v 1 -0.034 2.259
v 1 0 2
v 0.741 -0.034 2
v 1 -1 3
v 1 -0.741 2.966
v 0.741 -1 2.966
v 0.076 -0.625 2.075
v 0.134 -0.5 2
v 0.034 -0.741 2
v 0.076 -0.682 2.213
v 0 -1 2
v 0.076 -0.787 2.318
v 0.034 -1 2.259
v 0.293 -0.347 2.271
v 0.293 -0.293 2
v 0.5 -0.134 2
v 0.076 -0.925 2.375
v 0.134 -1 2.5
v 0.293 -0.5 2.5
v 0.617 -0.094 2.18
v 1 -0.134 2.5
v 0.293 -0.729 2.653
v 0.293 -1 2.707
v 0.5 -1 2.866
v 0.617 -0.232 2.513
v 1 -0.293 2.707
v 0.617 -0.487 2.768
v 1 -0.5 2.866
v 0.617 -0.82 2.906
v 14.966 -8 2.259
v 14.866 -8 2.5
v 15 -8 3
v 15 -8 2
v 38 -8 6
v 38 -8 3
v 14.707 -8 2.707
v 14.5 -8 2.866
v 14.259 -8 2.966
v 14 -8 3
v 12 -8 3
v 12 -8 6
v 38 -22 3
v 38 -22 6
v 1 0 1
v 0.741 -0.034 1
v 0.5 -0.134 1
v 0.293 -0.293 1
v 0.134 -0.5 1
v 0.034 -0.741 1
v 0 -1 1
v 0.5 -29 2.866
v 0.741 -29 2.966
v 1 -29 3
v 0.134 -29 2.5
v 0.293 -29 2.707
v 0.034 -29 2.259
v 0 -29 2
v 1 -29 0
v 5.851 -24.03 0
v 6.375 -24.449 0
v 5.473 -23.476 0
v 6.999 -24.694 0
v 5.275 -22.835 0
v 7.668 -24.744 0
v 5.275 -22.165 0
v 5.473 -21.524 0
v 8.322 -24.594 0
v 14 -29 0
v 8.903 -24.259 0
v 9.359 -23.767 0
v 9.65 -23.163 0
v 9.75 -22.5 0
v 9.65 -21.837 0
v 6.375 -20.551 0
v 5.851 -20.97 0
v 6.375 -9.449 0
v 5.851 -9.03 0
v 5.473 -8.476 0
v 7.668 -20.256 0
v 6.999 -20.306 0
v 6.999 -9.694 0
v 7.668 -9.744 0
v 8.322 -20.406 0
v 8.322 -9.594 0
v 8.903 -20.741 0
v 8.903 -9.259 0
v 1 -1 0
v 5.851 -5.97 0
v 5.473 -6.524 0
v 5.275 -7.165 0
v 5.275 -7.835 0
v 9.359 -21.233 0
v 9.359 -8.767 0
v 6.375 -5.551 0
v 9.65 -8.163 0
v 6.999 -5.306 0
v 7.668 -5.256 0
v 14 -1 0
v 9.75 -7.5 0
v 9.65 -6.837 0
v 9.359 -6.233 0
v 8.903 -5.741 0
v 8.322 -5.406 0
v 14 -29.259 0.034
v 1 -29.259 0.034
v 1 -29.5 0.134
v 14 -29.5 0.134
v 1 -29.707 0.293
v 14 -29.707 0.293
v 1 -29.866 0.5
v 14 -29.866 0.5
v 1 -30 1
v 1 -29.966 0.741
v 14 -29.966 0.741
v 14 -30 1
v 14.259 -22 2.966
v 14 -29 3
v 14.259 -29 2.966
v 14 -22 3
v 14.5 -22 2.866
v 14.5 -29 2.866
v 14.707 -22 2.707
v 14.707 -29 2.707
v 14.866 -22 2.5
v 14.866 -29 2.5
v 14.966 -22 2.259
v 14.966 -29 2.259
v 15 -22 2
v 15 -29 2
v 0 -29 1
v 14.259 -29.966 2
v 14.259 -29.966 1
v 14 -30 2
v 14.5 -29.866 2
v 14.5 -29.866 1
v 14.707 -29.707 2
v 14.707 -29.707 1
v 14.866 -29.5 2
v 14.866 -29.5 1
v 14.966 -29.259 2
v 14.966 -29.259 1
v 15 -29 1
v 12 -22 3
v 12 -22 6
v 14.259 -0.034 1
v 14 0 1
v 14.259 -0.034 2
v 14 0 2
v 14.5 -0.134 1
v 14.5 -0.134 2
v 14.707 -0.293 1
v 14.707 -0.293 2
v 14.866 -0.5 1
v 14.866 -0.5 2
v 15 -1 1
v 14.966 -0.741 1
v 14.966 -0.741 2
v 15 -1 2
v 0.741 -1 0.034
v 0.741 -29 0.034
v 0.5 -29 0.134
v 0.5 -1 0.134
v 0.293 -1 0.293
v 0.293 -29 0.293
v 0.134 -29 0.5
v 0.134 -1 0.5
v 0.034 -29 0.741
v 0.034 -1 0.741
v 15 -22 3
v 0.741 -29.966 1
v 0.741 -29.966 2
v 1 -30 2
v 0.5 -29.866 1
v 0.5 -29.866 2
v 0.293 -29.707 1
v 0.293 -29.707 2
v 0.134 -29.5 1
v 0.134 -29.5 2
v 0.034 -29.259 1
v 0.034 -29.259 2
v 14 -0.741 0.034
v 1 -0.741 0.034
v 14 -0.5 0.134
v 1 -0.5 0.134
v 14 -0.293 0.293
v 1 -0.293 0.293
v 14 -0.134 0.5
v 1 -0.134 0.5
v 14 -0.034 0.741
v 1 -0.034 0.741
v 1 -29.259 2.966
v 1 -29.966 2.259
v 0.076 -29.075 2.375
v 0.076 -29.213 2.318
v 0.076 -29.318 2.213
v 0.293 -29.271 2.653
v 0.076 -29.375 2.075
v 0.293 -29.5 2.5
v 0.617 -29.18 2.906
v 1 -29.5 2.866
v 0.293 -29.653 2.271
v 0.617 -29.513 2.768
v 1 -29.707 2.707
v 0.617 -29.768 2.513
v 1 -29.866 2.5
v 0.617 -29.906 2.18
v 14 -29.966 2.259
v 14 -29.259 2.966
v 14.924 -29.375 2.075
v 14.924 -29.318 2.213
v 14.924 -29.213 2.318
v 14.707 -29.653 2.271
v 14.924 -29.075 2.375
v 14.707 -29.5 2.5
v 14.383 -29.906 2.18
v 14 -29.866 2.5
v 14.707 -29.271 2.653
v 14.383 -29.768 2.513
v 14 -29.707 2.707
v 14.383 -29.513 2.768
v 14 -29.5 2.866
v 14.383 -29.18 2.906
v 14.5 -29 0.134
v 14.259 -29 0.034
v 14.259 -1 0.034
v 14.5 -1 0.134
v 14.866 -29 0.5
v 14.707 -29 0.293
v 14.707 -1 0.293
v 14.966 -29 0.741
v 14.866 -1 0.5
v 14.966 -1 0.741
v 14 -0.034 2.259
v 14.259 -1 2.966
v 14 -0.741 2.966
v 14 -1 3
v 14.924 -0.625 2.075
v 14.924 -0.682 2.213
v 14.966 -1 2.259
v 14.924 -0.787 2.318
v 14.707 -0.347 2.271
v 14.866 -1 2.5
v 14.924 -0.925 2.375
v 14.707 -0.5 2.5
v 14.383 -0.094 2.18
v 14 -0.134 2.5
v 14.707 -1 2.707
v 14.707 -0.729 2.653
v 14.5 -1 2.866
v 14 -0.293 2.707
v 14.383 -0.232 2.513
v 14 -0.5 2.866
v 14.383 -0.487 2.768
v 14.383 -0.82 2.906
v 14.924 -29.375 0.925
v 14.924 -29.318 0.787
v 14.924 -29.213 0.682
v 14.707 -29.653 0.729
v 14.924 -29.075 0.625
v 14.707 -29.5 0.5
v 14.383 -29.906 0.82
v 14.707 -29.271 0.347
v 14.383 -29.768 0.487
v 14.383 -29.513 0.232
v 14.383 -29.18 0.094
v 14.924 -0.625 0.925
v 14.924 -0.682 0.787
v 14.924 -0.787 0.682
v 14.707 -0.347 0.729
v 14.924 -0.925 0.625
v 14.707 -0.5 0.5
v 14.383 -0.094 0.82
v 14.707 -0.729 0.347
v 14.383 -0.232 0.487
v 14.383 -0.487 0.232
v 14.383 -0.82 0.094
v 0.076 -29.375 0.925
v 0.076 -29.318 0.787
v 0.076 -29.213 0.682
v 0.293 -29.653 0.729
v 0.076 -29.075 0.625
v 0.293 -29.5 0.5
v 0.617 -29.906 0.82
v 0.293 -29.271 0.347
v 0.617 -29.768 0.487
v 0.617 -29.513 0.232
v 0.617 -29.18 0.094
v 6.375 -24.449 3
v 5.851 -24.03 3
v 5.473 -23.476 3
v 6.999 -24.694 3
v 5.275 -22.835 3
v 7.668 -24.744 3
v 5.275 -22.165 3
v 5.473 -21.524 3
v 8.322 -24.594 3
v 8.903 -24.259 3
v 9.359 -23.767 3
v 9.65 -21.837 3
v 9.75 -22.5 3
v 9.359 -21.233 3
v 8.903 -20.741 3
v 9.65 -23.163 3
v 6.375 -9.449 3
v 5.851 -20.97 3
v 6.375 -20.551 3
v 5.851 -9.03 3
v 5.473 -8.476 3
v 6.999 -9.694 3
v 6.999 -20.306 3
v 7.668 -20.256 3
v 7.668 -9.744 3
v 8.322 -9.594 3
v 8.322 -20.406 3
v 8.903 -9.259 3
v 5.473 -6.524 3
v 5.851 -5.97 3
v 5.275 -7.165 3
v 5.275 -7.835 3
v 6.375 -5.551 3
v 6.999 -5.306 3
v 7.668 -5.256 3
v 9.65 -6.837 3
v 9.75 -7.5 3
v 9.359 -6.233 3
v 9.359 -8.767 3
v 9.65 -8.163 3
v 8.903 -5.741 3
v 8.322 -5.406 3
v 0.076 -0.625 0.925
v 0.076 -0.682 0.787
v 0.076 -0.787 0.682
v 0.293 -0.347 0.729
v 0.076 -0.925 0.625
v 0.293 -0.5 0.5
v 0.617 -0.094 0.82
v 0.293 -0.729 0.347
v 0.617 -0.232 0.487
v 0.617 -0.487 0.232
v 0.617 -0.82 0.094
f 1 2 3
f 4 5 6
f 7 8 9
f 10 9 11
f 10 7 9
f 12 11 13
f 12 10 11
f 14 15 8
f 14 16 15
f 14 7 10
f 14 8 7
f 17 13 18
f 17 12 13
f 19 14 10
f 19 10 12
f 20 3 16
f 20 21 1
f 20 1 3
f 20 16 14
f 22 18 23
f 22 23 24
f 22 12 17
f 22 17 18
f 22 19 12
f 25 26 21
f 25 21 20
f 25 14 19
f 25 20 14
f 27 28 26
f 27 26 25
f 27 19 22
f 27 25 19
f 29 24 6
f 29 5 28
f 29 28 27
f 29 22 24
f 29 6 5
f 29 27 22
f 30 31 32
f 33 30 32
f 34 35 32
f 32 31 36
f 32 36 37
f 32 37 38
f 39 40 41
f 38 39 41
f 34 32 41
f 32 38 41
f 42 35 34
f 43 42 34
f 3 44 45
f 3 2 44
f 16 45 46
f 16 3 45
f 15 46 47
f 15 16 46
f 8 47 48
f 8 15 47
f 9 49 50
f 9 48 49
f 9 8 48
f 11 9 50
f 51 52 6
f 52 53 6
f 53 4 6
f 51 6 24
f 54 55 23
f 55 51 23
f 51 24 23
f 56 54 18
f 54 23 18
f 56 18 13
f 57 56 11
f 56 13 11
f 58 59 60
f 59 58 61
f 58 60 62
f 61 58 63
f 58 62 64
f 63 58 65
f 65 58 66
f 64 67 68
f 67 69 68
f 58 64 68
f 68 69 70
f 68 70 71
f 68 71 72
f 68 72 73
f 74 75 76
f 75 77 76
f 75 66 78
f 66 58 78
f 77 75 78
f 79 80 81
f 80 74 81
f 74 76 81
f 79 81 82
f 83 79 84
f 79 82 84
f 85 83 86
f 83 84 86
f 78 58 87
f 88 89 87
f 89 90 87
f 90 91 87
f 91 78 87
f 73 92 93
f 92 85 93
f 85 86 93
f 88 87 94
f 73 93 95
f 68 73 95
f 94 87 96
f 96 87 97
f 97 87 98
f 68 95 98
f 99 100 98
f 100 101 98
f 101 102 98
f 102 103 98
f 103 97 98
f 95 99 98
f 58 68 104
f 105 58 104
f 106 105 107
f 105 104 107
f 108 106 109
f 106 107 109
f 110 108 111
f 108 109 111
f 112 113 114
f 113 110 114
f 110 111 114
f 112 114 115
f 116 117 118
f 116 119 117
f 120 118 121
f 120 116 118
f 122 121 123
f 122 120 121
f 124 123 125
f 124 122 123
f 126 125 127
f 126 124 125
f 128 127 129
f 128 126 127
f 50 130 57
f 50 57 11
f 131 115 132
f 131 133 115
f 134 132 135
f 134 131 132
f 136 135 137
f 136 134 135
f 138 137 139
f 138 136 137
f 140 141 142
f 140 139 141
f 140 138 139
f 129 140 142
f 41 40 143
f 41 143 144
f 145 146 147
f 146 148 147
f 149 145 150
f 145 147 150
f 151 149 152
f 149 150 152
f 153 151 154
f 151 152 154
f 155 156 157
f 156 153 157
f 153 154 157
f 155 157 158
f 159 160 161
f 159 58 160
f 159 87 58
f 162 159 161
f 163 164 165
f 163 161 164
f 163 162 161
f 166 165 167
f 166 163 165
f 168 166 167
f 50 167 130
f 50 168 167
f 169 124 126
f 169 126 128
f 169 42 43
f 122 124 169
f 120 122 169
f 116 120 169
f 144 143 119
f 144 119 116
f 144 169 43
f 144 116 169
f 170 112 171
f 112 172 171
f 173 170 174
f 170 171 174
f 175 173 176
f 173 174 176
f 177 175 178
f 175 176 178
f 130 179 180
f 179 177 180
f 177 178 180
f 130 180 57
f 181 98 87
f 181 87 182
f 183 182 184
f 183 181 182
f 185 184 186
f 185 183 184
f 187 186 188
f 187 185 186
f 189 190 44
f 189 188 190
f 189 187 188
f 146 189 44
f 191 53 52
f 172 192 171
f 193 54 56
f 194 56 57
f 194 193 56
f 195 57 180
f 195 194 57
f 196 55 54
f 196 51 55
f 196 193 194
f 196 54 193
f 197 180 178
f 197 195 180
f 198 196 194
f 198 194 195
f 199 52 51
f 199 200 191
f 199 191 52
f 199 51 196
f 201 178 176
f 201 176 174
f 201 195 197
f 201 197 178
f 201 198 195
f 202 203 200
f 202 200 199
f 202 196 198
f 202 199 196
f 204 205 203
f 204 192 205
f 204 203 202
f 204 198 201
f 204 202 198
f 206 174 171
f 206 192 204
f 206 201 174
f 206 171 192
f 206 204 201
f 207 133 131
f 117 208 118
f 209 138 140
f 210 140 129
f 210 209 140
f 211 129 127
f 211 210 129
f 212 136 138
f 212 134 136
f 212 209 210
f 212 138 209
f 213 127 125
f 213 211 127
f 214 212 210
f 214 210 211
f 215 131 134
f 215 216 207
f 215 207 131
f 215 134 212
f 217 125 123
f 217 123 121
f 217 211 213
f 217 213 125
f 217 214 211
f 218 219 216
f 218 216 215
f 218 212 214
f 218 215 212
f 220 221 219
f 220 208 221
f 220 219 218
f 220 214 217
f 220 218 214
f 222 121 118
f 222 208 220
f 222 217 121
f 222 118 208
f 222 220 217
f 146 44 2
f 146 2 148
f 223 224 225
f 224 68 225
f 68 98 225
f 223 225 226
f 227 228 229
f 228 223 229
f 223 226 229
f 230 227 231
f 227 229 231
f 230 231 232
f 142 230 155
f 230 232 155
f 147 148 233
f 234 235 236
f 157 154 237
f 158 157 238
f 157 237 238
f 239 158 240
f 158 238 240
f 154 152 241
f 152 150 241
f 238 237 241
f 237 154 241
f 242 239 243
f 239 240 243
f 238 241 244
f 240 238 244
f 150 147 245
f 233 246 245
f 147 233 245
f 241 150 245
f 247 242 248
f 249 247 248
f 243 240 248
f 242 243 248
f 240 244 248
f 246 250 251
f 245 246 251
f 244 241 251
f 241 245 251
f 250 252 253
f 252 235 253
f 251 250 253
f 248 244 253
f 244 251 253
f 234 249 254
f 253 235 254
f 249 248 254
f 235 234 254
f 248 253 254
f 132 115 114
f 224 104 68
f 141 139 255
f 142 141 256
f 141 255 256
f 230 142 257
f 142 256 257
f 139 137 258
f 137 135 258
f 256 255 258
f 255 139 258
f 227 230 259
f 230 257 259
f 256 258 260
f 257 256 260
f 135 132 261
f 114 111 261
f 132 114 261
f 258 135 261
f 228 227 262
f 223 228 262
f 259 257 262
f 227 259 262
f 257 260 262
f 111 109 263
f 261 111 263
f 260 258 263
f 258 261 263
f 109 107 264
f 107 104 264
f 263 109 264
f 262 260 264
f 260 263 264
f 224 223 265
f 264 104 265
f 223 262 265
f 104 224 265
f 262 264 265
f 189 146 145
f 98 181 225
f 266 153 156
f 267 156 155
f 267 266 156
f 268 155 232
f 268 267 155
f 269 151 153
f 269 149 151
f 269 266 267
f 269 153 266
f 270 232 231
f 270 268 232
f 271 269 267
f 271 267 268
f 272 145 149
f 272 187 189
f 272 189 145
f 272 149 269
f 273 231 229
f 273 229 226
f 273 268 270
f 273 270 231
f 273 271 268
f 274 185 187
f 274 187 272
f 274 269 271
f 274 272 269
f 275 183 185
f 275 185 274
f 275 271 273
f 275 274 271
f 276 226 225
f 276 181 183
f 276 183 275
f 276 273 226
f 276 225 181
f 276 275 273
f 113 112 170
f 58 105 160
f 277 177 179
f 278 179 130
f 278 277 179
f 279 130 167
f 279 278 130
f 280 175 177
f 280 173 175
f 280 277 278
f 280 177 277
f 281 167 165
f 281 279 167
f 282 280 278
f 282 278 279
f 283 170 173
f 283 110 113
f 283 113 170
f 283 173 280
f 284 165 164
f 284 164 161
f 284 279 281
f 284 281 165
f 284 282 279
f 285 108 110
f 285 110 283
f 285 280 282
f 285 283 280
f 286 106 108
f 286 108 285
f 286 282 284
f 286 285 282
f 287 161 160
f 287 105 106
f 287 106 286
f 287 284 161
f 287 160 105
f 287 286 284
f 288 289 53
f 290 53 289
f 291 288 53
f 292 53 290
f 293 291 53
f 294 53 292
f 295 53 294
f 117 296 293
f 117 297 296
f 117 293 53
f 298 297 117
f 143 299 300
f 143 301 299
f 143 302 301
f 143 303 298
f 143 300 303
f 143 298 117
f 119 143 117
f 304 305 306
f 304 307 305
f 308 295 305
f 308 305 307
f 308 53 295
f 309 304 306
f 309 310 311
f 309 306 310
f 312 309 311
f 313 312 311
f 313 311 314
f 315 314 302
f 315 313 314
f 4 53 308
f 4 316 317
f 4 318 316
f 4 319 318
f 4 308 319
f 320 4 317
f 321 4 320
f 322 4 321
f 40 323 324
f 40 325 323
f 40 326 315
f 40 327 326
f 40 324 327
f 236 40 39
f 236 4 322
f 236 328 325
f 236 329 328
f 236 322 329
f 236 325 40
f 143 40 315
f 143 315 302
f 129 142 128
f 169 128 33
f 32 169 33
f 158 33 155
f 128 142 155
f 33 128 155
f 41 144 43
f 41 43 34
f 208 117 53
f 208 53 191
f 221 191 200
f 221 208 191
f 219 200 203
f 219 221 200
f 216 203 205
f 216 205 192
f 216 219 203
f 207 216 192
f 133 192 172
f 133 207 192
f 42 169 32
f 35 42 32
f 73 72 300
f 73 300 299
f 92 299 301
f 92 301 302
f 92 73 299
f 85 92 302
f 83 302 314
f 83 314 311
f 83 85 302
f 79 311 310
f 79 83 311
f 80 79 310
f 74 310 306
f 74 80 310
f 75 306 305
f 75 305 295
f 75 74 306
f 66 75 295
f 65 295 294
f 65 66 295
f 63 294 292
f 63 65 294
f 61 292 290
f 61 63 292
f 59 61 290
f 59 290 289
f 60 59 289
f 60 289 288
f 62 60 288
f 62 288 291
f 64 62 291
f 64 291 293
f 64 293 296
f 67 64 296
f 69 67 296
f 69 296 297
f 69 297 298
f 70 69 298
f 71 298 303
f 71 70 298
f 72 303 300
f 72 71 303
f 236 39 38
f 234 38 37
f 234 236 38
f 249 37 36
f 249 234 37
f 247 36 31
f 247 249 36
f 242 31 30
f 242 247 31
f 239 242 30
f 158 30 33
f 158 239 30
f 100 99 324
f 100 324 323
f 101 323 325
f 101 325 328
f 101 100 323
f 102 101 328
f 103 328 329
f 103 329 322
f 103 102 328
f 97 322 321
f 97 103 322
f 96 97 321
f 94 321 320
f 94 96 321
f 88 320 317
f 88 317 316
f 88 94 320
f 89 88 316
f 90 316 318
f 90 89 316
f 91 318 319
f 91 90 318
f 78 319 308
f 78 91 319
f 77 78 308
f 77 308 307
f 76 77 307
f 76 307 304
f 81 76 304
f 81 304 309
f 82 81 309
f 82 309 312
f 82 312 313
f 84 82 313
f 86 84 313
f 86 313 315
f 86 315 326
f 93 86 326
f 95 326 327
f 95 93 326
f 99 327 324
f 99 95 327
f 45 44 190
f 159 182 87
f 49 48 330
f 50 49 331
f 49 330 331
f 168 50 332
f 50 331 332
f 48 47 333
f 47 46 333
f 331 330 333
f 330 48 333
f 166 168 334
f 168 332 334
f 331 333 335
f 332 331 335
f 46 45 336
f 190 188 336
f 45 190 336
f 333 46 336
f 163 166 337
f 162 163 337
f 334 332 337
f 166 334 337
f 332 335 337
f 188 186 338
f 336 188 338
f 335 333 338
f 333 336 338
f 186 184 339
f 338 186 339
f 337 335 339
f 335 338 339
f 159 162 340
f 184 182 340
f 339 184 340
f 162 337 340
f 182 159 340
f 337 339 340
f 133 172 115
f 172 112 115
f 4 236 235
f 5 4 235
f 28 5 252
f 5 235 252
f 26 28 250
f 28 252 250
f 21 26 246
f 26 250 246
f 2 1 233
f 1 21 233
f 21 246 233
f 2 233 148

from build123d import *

# Parameters (mm, degrees)
SKETCH1_W           = 15
SKETCH1_H           = 30
SKETCH1_R           = 2.25
BOSS_EXTRUDE1_DEPTH = 3
SKETCH3_W           = 3
SKETCH3_H           = 14
BOSS_EXTRUDE2_DEPTH = 3
SKETCH4_W           = 3
SKETCH4_H           = 14
BOSS_EXTRUDE3_DEPTH = 26
FILLET2_R           = 1


with BuildPart() as part:
    # Sketch1 → Boss-Extrude1 (new body)
    with BuildSketch(Plane.XY):
        with Locations((7.5, -15)):
            Rectangle(SKETCH1_W, SKETCH1_H)
        with Locations((7.5, -7.5)):
            Circle(SKETCH1_R, mode=Mode.SUBTRACT)
        with Locations((7.5, -22.5)):
            Circle(SKETCH1_R, mode=Mode.SUBTRACT)
    extrude(amount=BOSS_EXTRUDE1_DEPTH)

    # Sketch3 → Boss-Extrude2 (add)
    with BuildSketch(Plane.ZY.offset(-15)):
        with Locations((4.5, -15)):
            Rectangle(SKETCH3_W, SKETCH3_H)
    extrude(amount=BOSS_EXTRUDE2_DEPTH)

    # Sketch4 → Boss-Extrude3 (add)
    with BuildSketch(Plane.ZY.offset(-12)):
        with Locations((4.5, -15)):
            Rectangle(SKETCH4_W, SKETCH4_H)
    extrude(amount=-BOSS_EXTRUDE3_DEPTH)

    # Fillet2
    fillet2_edges = [part.edges().sort_by_distance(p)[0] for p in [
        (7.5, -30, 3),
        (7.5, -30, 0),
        (7.5, 0, 0),
        (7.5, 0, 3),
        (0, 0, 1.5),
        (0, -15, 3),
        (0, -30, 1.5),
        (0, -15, 0),
        (15, -30, 1.5),
        (15, 0, 1.5),
        (15, -4, 3),
        (15, -26, 3),
        (15, -15, 0),
    ]]
    fillet(fillet2_edges, radius=FILLET2_R)


solid = part.part
